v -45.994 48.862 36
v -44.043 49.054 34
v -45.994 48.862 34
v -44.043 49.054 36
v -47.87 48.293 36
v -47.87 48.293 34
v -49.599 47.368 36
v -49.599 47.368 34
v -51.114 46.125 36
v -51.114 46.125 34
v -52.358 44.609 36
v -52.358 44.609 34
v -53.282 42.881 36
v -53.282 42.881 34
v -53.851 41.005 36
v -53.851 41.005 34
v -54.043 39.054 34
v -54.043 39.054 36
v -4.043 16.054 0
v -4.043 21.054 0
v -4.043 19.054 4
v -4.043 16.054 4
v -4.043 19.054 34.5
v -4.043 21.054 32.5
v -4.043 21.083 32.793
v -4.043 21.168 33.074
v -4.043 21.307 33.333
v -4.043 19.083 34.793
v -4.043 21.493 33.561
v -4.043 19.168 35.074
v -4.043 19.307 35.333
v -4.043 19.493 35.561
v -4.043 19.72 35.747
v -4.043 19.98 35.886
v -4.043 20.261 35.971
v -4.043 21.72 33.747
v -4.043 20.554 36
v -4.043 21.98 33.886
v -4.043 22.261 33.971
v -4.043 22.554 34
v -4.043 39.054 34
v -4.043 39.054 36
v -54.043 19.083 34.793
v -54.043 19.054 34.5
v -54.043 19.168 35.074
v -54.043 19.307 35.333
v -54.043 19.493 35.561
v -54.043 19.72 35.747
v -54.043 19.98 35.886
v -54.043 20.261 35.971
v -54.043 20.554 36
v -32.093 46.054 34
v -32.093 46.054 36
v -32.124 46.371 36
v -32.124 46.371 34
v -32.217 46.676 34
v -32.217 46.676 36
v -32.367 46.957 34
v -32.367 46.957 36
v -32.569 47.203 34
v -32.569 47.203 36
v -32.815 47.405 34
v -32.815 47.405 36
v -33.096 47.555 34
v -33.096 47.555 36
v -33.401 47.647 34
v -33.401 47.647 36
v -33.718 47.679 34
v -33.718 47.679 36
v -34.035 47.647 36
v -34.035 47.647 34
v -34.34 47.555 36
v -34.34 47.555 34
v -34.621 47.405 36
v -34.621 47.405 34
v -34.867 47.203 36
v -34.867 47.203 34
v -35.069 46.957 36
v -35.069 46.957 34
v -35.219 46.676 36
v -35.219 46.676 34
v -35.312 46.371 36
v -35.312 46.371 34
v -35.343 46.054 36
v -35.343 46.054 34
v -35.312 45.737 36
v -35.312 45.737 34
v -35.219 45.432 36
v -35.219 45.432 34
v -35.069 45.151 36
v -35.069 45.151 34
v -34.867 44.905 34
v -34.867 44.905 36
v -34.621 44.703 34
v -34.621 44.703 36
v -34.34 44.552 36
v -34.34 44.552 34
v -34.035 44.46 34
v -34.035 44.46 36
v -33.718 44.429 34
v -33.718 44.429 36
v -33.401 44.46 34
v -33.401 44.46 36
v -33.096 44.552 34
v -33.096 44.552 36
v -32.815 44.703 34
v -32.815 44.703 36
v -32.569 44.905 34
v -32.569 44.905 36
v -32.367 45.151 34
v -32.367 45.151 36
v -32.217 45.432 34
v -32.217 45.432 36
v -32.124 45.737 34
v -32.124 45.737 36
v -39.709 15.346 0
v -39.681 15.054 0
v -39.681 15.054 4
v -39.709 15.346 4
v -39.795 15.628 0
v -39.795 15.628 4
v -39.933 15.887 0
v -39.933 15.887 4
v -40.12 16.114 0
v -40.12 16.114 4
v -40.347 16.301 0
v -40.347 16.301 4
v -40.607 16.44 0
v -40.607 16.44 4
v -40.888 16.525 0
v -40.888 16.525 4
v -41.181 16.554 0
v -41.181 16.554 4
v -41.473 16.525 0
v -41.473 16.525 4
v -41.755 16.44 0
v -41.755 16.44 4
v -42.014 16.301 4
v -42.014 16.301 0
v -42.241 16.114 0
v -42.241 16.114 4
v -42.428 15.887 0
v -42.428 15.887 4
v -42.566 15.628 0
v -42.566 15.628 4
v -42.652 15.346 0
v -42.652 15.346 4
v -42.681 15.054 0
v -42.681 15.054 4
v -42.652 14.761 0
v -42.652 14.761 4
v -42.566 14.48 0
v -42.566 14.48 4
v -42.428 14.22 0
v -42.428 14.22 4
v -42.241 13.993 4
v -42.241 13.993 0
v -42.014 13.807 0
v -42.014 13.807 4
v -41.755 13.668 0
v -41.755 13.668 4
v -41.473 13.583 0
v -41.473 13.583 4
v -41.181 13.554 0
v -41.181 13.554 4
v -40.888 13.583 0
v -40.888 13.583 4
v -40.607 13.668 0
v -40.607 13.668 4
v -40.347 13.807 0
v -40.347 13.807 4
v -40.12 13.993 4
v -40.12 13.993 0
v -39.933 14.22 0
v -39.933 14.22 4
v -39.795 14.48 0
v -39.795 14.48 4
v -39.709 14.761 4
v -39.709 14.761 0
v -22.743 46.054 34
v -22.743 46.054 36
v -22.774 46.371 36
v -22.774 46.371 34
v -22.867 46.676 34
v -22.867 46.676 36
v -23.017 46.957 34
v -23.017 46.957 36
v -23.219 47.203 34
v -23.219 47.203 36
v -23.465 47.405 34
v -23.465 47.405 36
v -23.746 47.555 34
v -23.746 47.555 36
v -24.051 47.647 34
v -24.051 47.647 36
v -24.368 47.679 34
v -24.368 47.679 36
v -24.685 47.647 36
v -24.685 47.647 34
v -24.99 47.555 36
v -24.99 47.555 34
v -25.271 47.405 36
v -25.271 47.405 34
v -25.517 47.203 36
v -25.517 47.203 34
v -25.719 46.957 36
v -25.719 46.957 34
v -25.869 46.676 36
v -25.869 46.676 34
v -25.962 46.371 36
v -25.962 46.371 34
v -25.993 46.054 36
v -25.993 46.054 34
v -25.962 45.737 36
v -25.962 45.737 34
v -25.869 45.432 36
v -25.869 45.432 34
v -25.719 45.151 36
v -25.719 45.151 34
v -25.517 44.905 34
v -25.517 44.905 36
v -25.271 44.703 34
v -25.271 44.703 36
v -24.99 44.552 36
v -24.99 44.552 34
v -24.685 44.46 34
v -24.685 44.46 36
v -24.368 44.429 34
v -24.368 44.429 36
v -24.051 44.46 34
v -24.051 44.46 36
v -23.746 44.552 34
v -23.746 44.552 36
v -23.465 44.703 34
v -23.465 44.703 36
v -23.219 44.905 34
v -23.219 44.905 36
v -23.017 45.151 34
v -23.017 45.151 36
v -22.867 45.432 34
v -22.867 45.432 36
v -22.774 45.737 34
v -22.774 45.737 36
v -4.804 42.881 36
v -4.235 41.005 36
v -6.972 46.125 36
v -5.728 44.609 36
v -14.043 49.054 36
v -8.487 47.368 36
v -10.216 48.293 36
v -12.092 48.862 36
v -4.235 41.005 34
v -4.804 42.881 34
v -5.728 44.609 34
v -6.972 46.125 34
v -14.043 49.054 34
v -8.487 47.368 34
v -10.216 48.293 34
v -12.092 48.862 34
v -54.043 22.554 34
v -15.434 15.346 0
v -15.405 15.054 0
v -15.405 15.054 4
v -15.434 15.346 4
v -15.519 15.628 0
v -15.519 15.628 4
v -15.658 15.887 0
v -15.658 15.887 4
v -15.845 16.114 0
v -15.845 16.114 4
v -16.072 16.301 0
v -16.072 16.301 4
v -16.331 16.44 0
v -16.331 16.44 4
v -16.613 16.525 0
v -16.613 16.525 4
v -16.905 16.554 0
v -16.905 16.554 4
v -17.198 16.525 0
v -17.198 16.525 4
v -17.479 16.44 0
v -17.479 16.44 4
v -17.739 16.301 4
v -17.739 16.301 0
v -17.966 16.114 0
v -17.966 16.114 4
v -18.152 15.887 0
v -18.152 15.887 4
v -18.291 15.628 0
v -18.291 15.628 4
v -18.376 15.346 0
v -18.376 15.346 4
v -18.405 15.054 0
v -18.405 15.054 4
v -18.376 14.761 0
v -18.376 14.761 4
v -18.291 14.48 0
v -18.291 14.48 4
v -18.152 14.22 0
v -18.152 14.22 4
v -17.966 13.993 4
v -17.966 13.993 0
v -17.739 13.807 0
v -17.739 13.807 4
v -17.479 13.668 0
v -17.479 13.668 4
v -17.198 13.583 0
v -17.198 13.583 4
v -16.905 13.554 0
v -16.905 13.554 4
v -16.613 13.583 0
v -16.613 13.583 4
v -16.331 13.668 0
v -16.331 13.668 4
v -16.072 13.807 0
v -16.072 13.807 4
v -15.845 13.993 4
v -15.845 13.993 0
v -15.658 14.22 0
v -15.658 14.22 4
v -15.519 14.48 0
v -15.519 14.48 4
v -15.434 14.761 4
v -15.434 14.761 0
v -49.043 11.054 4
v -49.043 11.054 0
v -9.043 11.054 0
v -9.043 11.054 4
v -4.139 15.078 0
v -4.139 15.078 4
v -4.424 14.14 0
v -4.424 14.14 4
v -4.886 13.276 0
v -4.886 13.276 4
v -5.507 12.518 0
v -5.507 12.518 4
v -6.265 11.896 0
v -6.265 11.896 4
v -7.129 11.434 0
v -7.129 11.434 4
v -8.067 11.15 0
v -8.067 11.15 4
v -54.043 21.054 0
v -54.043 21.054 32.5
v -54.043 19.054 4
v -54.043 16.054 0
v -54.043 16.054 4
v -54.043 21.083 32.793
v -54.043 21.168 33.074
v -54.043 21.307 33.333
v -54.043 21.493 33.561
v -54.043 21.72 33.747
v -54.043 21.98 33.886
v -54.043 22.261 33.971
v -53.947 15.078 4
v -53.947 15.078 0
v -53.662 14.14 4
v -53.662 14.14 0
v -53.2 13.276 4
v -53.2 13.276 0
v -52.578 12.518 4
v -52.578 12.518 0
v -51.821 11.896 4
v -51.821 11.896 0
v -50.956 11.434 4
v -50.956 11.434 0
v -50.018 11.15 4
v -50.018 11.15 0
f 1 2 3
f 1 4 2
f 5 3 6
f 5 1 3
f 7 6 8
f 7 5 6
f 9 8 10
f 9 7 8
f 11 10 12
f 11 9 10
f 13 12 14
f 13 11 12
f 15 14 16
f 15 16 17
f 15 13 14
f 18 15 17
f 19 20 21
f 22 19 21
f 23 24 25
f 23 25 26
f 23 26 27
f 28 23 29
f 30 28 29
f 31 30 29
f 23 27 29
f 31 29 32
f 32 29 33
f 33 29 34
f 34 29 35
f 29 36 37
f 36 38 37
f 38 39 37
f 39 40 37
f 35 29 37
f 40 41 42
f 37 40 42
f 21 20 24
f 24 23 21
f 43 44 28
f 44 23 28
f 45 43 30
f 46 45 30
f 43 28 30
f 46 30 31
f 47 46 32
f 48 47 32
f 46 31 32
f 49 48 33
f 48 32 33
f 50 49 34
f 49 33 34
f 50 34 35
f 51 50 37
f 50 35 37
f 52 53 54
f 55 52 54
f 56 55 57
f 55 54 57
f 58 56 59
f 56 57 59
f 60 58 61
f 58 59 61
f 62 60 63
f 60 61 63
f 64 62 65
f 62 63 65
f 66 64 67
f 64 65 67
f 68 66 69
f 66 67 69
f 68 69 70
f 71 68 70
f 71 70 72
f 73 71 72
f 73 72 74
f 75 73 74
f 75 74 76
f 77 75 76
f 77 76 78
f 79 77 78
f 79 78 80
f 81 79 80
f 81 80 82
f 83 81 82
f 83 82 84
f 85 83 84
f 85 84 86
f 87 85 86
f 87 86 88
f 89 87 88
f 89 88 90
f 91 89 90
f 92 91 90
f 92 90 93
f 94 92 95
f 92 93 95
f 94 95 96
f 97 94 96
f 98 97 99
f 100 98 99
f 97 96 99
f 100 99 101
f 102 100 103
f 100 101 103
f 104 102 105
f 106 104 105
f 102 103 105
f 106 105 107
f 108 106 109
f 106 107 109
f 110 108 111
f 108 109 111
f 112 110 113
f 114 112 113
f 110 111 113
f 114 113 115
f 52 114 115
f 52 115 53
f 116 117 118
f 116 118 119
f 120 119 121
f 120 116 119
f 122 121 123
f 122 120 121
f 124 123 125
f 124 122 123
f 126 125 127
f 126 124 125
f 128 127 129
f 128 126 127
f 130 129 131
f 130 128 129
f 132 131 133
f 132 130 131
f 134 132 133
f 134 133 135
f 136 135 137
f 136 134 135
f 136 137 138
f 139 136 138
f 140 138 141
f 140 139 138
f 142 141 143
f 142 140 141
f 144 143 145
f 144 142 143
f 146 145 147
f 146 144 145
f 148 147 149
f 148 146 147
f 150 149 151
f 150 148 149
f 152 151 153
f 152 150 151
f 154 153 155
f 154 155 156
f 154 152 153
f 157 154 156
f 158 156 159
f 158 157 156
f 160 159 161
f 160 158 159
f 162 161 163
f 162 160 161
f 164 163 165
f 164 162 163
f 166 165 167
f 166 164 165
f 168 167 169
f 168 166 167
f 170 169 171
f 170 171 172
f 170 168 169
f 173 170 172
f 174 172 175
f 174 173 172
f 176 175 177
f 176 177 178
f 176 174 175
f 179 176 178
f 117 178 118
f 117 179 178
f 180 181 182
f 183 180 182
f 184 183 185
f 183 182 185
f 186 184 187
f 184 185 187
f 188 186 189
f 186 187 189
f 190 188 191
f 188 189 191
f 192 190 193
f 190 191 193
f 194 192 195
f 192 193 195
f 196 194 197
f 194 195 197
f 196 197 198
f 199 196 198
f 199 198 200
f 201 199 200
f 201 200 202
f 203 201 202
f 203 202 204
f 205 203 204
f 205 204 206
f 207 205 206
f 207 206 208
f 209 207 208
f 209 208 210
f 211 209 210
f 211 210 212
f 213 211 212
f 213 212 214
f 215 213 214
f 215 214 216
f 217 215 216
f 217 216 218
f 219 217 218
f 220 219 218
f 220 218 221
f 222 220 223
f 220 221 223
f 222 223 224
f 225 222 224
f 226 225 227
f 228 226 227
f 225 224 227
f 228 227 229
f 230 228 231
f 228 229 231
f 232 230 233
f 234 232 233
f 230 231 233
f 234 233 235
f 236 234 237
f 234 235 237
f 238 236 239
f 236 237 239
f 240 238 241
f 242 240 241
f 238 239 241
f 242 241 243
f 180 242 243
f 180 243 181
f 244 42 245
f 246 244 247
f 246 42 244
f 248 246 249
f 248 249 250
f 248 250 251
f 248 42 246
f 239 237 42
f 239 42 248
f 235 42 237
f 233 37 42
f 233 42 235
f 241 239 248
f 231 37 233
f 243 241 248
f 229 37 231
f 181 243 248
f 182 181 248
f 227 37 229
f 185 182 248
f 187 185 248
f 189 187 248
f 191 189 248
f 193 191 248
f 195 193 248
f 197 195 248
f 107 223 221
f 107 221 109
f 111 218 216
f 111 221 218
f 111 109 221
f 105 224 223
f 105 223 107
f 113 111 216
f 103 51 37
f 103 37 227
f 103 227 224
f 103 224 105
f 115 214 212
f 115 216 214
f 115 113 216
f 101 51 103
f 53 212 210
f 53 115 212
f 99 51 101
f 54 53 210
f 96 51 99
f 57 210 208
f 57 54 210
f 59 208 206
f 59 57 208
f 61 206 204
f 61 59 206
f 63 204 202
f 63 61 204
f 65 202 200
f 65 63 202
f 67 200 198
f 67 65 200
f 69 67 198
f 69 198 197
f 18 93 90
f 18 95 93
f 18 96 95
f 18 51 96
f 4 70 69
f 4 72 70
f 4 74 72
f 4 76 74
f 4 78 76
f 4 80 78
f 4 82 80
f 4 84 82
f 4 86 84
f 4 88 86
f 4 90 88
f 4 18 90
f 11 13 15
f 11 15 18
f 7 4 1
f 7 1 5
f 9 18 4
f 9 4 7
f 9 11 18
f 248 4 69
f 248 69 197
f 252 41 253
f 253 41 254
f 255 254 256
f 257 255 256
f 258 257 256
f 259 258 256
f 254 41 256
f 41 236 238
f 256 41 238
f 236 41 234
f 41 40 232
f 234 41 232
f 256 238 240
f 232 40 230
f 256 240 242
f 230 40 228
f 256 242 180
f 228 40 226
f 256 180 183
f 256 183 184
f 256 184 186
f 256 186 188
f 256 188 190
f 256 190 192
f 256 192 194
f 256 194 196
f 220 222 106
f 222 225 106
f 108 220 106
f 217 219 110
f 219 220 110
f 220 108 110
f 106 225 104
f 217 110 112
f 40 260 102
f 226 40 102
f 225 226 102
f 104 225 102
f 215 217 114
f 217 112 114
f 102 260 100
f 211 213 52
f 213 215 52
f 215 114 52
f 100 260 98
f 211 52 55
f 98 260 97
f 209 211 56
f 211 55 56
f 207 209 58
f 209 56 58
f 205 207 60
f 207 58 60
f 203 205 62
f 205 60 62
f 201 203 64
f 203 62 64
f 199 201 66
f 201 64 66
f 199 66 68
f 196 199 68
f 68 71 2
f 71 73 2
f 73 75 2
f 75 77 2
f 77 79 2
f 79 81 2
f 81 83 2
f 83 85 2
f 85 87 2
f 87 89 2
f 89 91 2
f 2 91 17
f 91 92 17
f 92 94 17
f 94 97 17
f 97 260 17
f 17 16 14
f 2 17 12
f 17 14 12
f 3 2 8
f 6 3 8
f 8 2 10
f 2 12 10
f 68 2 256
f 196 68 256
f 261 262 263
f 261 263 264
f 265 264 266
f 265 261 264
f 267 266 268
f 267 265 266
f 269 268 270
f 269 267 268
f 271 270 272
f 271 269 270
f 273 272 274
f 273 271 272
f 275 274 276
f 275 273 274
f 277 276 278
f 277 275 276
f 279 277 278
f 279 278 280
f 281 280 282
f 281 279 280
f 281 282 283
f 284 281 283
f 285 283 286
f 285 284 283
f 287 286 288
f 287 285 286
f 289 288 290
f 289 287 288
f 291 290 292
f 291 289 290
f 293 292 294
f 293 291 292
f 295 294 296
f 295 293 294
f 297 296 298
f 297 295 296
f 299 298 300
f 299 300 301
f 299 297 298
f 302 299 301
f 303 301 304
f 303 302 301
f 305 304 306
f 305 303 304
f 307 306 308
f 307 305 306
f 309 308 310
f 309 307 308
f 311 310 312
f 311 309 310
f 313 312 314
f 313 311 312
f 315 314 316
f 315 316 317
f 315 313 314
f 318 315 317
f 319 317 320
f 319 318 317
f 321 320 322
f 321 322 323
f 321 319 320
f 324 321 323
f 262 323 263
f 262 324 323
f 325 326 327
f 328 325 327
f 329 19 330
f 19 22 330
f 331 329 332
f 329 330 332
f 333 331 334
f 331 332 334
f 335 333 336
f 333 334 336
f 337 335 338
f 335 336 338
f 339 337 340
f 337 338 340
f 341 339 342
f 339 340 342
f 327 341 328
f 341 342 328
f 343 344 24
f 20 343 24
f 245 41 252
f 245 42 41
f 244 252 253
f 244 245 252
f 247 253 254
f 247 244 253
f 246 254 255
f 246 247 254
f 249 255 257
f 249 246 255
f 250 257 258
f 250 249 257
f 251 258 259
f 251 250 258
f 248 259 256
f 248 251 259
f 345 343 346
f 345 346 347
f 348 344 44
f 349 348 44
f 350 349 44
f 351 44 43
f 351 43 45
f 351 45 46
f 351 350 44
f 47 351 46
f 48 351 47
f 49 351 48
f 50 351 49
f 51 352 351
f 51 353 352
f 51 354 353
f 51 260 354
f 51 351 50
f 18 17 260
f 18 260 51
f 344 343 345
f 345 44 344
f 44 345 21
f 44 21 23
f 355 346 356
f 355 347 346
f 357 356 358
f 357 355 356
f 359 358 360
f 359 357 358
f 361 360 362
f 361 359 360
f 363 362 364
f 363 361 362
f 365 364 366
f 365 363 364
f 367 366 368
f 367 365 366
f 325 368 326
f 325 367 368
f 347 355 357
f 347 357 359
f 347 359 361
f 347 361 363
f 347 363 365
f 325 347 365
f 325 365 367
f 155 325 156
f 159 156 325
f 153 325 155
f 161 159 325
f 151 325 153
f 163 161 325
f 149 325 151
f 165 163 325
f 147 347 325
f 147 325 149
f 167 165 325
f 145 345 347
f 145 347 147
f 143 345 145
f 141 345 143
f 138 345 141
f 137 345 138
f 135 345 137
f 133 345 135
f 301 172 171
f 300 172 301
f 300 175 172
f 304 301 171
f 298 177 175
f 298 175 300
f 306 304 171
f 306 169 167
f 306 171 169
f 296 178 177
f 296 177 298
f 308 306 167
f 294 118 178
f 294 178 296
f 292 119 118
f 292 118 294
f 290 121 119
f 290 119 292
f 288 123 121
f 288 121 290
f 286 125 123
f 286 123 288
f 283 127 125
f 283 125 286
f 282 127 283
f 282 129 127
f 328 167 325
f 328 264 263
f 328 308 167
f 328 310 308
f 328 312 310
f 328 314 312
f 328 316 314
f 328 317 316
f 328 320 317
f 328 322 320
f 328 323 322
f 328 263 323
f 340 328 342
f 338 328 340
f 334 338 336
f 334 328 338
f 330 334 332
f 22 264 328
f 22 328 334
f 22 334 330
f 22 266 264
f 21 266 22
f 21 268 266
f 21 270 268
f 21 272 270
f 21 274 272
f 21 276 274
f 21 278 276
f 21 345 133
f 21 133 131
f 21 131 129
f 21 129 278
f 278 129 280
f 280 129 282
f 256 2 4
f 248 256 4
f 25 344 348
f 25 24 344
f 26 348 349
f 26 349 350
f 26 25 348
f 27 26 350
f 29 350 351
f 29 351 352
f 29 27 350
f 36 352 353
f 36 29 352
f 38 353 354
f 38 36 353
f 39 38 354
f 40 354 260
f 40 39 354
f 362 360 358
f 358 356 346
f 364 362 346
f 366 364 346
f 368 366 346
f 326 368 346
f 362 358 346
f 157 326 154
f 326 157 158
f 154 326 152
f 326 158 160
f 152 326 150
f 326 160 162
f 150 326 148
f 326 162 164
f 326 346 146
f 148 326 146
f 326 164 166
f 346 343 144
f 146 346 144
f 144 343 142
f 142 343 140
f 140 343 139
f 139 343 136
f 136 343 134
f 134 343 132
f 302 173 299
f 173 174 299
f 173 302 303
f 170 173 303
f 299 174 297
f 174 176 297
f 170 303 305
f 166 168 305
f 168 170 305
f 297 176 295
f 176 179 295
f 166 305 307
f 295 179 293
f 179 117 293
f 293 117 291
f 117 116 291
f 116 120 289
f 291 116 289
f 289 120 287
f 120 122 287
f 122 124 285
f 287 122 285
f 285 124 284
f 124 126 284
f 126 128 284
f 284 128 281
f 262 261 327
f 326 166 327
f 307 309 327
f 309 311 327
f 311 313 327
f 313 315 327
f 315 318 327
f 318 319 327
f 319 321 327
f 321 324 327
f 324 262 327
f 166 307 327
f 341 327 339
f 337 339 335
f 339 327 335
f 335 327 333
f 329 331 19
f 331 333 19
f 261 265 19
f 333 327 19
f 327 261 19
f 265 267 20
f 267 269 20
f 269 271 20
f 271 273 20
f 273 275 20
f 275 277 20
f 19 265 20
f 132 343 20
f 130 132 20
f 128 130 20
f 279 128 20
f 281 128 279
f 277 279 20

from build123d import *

# Parameters (mm, degrees)
SKETCH1_W                = 50
SKETCH1_H                = 8
SKETCH1_R                = 1.5
BOSS_EXTRUDE1_DEPTH      = 4
SKETCH2_W                = 50
SKETCH2_H                = 2
BOSS_EXTRUDE2_DEPTH      = 30
BOSS_EXTRUDE2_DEPTH_BACK = 4
SKETCH3_W                = 2
SKETCH3_H                = 30
BOSS_EXTRUDE3_DEPTH      = 50
FILLET1_R                = 10
FILLET2_R                = 5
FILLET3_R                = 1.5
SKETCH4_R                = 1.625
CUT_EXTRUDE1_DEPTH       = 13


with BuildPart() as part:
    # Sketch1 → Boss-Extrude1 (new body)
    with BuildSketch(Plane.XY):
        with Locations((-29.042911783, 15.053723554)):
            Rectangle(SKETCH1_W, SKETCH1_H)
        with Locations((-41.180553897, 15.053723554)):
            Circle(SKETCH1_R, mode=Mode.SUBTRACT)
        with Locations((-16.905269669, 15.053723554)):
            Circle(SKETCH1_R, mode=Mode.SUBTRACT)
    extrude(amount=BOSS_EXTRUDE1_DEPTH)

    # Sketch2 → Boss-Extrude2 (add, two sides)
    with BuildSketch(Plane.XY.offset(4)) as boss_extrude2_sk:
        with Locations((-29.042911783, 20.053723554)):
            Rectangle(SKETCH2_W, SKETCH2_H)
    extrude(amount=BOSS_EXTRUDE2_DEPTH)
    extrude(boss_extrude2_sk.sketch, amount=-BOSS_EXTRUDE2_DEPTH_BACK)

    # Sketch3 → Boss-Extrude3 (add)
    with BuildSketch(Plane.ZY.offset(54.042911783)):
        with Locations((35, 34.053723554)):
            Rectangle(SKETCH3_W, SKETCH3_H)
    extrude(amount=-BOSS_EXTRUDE3_DEPTH)

    # Fillet1
    fillet1_edges = [part.edges().sort_by_distance(p)[0] for p in [
        (-4.042911783, 49.053723554, 35),
        (-54.042911783, 49.053723554, 35),
    ]]
    fillet(fillet1_edges, radius=FILLET1_R)

    # Fillet2
    fillet2_edges = [part.edges().sort_by_distance(p)[0] for p in [
        (-54.042911783, 11.053723554, 2),
        (-4.042911783, 11.053723554, 2),
    ]]
    fillet(fillet2_edges, radius=FILLET2_R)

    # Fillet3
    fillet3_edges = [part.edges().sort_by_distance(p)[0] for p in [
        (-29.042911783, 21.053723554, 34),
        (-29.042911783, 19.053723554, 36),
    ]]
    fillet(fillet3_edges, radius=FILLET3_R)

    # Sketch4 → Cut-Extrude1 (cut)
    with BuildSketch(Plane.XY.offset(36)):
        with Locations((-24.367911783, 46.053723554)):
            Circle(SKETCH4_R)
        with Locations((-33.717911783, 46.053723554)):
            Circle(SKETCH4_R)
    extrude(amount=-CUT_EXTRUDE1_DEPTH, mode=Mode.SUBTRACT)


solid = part.part
